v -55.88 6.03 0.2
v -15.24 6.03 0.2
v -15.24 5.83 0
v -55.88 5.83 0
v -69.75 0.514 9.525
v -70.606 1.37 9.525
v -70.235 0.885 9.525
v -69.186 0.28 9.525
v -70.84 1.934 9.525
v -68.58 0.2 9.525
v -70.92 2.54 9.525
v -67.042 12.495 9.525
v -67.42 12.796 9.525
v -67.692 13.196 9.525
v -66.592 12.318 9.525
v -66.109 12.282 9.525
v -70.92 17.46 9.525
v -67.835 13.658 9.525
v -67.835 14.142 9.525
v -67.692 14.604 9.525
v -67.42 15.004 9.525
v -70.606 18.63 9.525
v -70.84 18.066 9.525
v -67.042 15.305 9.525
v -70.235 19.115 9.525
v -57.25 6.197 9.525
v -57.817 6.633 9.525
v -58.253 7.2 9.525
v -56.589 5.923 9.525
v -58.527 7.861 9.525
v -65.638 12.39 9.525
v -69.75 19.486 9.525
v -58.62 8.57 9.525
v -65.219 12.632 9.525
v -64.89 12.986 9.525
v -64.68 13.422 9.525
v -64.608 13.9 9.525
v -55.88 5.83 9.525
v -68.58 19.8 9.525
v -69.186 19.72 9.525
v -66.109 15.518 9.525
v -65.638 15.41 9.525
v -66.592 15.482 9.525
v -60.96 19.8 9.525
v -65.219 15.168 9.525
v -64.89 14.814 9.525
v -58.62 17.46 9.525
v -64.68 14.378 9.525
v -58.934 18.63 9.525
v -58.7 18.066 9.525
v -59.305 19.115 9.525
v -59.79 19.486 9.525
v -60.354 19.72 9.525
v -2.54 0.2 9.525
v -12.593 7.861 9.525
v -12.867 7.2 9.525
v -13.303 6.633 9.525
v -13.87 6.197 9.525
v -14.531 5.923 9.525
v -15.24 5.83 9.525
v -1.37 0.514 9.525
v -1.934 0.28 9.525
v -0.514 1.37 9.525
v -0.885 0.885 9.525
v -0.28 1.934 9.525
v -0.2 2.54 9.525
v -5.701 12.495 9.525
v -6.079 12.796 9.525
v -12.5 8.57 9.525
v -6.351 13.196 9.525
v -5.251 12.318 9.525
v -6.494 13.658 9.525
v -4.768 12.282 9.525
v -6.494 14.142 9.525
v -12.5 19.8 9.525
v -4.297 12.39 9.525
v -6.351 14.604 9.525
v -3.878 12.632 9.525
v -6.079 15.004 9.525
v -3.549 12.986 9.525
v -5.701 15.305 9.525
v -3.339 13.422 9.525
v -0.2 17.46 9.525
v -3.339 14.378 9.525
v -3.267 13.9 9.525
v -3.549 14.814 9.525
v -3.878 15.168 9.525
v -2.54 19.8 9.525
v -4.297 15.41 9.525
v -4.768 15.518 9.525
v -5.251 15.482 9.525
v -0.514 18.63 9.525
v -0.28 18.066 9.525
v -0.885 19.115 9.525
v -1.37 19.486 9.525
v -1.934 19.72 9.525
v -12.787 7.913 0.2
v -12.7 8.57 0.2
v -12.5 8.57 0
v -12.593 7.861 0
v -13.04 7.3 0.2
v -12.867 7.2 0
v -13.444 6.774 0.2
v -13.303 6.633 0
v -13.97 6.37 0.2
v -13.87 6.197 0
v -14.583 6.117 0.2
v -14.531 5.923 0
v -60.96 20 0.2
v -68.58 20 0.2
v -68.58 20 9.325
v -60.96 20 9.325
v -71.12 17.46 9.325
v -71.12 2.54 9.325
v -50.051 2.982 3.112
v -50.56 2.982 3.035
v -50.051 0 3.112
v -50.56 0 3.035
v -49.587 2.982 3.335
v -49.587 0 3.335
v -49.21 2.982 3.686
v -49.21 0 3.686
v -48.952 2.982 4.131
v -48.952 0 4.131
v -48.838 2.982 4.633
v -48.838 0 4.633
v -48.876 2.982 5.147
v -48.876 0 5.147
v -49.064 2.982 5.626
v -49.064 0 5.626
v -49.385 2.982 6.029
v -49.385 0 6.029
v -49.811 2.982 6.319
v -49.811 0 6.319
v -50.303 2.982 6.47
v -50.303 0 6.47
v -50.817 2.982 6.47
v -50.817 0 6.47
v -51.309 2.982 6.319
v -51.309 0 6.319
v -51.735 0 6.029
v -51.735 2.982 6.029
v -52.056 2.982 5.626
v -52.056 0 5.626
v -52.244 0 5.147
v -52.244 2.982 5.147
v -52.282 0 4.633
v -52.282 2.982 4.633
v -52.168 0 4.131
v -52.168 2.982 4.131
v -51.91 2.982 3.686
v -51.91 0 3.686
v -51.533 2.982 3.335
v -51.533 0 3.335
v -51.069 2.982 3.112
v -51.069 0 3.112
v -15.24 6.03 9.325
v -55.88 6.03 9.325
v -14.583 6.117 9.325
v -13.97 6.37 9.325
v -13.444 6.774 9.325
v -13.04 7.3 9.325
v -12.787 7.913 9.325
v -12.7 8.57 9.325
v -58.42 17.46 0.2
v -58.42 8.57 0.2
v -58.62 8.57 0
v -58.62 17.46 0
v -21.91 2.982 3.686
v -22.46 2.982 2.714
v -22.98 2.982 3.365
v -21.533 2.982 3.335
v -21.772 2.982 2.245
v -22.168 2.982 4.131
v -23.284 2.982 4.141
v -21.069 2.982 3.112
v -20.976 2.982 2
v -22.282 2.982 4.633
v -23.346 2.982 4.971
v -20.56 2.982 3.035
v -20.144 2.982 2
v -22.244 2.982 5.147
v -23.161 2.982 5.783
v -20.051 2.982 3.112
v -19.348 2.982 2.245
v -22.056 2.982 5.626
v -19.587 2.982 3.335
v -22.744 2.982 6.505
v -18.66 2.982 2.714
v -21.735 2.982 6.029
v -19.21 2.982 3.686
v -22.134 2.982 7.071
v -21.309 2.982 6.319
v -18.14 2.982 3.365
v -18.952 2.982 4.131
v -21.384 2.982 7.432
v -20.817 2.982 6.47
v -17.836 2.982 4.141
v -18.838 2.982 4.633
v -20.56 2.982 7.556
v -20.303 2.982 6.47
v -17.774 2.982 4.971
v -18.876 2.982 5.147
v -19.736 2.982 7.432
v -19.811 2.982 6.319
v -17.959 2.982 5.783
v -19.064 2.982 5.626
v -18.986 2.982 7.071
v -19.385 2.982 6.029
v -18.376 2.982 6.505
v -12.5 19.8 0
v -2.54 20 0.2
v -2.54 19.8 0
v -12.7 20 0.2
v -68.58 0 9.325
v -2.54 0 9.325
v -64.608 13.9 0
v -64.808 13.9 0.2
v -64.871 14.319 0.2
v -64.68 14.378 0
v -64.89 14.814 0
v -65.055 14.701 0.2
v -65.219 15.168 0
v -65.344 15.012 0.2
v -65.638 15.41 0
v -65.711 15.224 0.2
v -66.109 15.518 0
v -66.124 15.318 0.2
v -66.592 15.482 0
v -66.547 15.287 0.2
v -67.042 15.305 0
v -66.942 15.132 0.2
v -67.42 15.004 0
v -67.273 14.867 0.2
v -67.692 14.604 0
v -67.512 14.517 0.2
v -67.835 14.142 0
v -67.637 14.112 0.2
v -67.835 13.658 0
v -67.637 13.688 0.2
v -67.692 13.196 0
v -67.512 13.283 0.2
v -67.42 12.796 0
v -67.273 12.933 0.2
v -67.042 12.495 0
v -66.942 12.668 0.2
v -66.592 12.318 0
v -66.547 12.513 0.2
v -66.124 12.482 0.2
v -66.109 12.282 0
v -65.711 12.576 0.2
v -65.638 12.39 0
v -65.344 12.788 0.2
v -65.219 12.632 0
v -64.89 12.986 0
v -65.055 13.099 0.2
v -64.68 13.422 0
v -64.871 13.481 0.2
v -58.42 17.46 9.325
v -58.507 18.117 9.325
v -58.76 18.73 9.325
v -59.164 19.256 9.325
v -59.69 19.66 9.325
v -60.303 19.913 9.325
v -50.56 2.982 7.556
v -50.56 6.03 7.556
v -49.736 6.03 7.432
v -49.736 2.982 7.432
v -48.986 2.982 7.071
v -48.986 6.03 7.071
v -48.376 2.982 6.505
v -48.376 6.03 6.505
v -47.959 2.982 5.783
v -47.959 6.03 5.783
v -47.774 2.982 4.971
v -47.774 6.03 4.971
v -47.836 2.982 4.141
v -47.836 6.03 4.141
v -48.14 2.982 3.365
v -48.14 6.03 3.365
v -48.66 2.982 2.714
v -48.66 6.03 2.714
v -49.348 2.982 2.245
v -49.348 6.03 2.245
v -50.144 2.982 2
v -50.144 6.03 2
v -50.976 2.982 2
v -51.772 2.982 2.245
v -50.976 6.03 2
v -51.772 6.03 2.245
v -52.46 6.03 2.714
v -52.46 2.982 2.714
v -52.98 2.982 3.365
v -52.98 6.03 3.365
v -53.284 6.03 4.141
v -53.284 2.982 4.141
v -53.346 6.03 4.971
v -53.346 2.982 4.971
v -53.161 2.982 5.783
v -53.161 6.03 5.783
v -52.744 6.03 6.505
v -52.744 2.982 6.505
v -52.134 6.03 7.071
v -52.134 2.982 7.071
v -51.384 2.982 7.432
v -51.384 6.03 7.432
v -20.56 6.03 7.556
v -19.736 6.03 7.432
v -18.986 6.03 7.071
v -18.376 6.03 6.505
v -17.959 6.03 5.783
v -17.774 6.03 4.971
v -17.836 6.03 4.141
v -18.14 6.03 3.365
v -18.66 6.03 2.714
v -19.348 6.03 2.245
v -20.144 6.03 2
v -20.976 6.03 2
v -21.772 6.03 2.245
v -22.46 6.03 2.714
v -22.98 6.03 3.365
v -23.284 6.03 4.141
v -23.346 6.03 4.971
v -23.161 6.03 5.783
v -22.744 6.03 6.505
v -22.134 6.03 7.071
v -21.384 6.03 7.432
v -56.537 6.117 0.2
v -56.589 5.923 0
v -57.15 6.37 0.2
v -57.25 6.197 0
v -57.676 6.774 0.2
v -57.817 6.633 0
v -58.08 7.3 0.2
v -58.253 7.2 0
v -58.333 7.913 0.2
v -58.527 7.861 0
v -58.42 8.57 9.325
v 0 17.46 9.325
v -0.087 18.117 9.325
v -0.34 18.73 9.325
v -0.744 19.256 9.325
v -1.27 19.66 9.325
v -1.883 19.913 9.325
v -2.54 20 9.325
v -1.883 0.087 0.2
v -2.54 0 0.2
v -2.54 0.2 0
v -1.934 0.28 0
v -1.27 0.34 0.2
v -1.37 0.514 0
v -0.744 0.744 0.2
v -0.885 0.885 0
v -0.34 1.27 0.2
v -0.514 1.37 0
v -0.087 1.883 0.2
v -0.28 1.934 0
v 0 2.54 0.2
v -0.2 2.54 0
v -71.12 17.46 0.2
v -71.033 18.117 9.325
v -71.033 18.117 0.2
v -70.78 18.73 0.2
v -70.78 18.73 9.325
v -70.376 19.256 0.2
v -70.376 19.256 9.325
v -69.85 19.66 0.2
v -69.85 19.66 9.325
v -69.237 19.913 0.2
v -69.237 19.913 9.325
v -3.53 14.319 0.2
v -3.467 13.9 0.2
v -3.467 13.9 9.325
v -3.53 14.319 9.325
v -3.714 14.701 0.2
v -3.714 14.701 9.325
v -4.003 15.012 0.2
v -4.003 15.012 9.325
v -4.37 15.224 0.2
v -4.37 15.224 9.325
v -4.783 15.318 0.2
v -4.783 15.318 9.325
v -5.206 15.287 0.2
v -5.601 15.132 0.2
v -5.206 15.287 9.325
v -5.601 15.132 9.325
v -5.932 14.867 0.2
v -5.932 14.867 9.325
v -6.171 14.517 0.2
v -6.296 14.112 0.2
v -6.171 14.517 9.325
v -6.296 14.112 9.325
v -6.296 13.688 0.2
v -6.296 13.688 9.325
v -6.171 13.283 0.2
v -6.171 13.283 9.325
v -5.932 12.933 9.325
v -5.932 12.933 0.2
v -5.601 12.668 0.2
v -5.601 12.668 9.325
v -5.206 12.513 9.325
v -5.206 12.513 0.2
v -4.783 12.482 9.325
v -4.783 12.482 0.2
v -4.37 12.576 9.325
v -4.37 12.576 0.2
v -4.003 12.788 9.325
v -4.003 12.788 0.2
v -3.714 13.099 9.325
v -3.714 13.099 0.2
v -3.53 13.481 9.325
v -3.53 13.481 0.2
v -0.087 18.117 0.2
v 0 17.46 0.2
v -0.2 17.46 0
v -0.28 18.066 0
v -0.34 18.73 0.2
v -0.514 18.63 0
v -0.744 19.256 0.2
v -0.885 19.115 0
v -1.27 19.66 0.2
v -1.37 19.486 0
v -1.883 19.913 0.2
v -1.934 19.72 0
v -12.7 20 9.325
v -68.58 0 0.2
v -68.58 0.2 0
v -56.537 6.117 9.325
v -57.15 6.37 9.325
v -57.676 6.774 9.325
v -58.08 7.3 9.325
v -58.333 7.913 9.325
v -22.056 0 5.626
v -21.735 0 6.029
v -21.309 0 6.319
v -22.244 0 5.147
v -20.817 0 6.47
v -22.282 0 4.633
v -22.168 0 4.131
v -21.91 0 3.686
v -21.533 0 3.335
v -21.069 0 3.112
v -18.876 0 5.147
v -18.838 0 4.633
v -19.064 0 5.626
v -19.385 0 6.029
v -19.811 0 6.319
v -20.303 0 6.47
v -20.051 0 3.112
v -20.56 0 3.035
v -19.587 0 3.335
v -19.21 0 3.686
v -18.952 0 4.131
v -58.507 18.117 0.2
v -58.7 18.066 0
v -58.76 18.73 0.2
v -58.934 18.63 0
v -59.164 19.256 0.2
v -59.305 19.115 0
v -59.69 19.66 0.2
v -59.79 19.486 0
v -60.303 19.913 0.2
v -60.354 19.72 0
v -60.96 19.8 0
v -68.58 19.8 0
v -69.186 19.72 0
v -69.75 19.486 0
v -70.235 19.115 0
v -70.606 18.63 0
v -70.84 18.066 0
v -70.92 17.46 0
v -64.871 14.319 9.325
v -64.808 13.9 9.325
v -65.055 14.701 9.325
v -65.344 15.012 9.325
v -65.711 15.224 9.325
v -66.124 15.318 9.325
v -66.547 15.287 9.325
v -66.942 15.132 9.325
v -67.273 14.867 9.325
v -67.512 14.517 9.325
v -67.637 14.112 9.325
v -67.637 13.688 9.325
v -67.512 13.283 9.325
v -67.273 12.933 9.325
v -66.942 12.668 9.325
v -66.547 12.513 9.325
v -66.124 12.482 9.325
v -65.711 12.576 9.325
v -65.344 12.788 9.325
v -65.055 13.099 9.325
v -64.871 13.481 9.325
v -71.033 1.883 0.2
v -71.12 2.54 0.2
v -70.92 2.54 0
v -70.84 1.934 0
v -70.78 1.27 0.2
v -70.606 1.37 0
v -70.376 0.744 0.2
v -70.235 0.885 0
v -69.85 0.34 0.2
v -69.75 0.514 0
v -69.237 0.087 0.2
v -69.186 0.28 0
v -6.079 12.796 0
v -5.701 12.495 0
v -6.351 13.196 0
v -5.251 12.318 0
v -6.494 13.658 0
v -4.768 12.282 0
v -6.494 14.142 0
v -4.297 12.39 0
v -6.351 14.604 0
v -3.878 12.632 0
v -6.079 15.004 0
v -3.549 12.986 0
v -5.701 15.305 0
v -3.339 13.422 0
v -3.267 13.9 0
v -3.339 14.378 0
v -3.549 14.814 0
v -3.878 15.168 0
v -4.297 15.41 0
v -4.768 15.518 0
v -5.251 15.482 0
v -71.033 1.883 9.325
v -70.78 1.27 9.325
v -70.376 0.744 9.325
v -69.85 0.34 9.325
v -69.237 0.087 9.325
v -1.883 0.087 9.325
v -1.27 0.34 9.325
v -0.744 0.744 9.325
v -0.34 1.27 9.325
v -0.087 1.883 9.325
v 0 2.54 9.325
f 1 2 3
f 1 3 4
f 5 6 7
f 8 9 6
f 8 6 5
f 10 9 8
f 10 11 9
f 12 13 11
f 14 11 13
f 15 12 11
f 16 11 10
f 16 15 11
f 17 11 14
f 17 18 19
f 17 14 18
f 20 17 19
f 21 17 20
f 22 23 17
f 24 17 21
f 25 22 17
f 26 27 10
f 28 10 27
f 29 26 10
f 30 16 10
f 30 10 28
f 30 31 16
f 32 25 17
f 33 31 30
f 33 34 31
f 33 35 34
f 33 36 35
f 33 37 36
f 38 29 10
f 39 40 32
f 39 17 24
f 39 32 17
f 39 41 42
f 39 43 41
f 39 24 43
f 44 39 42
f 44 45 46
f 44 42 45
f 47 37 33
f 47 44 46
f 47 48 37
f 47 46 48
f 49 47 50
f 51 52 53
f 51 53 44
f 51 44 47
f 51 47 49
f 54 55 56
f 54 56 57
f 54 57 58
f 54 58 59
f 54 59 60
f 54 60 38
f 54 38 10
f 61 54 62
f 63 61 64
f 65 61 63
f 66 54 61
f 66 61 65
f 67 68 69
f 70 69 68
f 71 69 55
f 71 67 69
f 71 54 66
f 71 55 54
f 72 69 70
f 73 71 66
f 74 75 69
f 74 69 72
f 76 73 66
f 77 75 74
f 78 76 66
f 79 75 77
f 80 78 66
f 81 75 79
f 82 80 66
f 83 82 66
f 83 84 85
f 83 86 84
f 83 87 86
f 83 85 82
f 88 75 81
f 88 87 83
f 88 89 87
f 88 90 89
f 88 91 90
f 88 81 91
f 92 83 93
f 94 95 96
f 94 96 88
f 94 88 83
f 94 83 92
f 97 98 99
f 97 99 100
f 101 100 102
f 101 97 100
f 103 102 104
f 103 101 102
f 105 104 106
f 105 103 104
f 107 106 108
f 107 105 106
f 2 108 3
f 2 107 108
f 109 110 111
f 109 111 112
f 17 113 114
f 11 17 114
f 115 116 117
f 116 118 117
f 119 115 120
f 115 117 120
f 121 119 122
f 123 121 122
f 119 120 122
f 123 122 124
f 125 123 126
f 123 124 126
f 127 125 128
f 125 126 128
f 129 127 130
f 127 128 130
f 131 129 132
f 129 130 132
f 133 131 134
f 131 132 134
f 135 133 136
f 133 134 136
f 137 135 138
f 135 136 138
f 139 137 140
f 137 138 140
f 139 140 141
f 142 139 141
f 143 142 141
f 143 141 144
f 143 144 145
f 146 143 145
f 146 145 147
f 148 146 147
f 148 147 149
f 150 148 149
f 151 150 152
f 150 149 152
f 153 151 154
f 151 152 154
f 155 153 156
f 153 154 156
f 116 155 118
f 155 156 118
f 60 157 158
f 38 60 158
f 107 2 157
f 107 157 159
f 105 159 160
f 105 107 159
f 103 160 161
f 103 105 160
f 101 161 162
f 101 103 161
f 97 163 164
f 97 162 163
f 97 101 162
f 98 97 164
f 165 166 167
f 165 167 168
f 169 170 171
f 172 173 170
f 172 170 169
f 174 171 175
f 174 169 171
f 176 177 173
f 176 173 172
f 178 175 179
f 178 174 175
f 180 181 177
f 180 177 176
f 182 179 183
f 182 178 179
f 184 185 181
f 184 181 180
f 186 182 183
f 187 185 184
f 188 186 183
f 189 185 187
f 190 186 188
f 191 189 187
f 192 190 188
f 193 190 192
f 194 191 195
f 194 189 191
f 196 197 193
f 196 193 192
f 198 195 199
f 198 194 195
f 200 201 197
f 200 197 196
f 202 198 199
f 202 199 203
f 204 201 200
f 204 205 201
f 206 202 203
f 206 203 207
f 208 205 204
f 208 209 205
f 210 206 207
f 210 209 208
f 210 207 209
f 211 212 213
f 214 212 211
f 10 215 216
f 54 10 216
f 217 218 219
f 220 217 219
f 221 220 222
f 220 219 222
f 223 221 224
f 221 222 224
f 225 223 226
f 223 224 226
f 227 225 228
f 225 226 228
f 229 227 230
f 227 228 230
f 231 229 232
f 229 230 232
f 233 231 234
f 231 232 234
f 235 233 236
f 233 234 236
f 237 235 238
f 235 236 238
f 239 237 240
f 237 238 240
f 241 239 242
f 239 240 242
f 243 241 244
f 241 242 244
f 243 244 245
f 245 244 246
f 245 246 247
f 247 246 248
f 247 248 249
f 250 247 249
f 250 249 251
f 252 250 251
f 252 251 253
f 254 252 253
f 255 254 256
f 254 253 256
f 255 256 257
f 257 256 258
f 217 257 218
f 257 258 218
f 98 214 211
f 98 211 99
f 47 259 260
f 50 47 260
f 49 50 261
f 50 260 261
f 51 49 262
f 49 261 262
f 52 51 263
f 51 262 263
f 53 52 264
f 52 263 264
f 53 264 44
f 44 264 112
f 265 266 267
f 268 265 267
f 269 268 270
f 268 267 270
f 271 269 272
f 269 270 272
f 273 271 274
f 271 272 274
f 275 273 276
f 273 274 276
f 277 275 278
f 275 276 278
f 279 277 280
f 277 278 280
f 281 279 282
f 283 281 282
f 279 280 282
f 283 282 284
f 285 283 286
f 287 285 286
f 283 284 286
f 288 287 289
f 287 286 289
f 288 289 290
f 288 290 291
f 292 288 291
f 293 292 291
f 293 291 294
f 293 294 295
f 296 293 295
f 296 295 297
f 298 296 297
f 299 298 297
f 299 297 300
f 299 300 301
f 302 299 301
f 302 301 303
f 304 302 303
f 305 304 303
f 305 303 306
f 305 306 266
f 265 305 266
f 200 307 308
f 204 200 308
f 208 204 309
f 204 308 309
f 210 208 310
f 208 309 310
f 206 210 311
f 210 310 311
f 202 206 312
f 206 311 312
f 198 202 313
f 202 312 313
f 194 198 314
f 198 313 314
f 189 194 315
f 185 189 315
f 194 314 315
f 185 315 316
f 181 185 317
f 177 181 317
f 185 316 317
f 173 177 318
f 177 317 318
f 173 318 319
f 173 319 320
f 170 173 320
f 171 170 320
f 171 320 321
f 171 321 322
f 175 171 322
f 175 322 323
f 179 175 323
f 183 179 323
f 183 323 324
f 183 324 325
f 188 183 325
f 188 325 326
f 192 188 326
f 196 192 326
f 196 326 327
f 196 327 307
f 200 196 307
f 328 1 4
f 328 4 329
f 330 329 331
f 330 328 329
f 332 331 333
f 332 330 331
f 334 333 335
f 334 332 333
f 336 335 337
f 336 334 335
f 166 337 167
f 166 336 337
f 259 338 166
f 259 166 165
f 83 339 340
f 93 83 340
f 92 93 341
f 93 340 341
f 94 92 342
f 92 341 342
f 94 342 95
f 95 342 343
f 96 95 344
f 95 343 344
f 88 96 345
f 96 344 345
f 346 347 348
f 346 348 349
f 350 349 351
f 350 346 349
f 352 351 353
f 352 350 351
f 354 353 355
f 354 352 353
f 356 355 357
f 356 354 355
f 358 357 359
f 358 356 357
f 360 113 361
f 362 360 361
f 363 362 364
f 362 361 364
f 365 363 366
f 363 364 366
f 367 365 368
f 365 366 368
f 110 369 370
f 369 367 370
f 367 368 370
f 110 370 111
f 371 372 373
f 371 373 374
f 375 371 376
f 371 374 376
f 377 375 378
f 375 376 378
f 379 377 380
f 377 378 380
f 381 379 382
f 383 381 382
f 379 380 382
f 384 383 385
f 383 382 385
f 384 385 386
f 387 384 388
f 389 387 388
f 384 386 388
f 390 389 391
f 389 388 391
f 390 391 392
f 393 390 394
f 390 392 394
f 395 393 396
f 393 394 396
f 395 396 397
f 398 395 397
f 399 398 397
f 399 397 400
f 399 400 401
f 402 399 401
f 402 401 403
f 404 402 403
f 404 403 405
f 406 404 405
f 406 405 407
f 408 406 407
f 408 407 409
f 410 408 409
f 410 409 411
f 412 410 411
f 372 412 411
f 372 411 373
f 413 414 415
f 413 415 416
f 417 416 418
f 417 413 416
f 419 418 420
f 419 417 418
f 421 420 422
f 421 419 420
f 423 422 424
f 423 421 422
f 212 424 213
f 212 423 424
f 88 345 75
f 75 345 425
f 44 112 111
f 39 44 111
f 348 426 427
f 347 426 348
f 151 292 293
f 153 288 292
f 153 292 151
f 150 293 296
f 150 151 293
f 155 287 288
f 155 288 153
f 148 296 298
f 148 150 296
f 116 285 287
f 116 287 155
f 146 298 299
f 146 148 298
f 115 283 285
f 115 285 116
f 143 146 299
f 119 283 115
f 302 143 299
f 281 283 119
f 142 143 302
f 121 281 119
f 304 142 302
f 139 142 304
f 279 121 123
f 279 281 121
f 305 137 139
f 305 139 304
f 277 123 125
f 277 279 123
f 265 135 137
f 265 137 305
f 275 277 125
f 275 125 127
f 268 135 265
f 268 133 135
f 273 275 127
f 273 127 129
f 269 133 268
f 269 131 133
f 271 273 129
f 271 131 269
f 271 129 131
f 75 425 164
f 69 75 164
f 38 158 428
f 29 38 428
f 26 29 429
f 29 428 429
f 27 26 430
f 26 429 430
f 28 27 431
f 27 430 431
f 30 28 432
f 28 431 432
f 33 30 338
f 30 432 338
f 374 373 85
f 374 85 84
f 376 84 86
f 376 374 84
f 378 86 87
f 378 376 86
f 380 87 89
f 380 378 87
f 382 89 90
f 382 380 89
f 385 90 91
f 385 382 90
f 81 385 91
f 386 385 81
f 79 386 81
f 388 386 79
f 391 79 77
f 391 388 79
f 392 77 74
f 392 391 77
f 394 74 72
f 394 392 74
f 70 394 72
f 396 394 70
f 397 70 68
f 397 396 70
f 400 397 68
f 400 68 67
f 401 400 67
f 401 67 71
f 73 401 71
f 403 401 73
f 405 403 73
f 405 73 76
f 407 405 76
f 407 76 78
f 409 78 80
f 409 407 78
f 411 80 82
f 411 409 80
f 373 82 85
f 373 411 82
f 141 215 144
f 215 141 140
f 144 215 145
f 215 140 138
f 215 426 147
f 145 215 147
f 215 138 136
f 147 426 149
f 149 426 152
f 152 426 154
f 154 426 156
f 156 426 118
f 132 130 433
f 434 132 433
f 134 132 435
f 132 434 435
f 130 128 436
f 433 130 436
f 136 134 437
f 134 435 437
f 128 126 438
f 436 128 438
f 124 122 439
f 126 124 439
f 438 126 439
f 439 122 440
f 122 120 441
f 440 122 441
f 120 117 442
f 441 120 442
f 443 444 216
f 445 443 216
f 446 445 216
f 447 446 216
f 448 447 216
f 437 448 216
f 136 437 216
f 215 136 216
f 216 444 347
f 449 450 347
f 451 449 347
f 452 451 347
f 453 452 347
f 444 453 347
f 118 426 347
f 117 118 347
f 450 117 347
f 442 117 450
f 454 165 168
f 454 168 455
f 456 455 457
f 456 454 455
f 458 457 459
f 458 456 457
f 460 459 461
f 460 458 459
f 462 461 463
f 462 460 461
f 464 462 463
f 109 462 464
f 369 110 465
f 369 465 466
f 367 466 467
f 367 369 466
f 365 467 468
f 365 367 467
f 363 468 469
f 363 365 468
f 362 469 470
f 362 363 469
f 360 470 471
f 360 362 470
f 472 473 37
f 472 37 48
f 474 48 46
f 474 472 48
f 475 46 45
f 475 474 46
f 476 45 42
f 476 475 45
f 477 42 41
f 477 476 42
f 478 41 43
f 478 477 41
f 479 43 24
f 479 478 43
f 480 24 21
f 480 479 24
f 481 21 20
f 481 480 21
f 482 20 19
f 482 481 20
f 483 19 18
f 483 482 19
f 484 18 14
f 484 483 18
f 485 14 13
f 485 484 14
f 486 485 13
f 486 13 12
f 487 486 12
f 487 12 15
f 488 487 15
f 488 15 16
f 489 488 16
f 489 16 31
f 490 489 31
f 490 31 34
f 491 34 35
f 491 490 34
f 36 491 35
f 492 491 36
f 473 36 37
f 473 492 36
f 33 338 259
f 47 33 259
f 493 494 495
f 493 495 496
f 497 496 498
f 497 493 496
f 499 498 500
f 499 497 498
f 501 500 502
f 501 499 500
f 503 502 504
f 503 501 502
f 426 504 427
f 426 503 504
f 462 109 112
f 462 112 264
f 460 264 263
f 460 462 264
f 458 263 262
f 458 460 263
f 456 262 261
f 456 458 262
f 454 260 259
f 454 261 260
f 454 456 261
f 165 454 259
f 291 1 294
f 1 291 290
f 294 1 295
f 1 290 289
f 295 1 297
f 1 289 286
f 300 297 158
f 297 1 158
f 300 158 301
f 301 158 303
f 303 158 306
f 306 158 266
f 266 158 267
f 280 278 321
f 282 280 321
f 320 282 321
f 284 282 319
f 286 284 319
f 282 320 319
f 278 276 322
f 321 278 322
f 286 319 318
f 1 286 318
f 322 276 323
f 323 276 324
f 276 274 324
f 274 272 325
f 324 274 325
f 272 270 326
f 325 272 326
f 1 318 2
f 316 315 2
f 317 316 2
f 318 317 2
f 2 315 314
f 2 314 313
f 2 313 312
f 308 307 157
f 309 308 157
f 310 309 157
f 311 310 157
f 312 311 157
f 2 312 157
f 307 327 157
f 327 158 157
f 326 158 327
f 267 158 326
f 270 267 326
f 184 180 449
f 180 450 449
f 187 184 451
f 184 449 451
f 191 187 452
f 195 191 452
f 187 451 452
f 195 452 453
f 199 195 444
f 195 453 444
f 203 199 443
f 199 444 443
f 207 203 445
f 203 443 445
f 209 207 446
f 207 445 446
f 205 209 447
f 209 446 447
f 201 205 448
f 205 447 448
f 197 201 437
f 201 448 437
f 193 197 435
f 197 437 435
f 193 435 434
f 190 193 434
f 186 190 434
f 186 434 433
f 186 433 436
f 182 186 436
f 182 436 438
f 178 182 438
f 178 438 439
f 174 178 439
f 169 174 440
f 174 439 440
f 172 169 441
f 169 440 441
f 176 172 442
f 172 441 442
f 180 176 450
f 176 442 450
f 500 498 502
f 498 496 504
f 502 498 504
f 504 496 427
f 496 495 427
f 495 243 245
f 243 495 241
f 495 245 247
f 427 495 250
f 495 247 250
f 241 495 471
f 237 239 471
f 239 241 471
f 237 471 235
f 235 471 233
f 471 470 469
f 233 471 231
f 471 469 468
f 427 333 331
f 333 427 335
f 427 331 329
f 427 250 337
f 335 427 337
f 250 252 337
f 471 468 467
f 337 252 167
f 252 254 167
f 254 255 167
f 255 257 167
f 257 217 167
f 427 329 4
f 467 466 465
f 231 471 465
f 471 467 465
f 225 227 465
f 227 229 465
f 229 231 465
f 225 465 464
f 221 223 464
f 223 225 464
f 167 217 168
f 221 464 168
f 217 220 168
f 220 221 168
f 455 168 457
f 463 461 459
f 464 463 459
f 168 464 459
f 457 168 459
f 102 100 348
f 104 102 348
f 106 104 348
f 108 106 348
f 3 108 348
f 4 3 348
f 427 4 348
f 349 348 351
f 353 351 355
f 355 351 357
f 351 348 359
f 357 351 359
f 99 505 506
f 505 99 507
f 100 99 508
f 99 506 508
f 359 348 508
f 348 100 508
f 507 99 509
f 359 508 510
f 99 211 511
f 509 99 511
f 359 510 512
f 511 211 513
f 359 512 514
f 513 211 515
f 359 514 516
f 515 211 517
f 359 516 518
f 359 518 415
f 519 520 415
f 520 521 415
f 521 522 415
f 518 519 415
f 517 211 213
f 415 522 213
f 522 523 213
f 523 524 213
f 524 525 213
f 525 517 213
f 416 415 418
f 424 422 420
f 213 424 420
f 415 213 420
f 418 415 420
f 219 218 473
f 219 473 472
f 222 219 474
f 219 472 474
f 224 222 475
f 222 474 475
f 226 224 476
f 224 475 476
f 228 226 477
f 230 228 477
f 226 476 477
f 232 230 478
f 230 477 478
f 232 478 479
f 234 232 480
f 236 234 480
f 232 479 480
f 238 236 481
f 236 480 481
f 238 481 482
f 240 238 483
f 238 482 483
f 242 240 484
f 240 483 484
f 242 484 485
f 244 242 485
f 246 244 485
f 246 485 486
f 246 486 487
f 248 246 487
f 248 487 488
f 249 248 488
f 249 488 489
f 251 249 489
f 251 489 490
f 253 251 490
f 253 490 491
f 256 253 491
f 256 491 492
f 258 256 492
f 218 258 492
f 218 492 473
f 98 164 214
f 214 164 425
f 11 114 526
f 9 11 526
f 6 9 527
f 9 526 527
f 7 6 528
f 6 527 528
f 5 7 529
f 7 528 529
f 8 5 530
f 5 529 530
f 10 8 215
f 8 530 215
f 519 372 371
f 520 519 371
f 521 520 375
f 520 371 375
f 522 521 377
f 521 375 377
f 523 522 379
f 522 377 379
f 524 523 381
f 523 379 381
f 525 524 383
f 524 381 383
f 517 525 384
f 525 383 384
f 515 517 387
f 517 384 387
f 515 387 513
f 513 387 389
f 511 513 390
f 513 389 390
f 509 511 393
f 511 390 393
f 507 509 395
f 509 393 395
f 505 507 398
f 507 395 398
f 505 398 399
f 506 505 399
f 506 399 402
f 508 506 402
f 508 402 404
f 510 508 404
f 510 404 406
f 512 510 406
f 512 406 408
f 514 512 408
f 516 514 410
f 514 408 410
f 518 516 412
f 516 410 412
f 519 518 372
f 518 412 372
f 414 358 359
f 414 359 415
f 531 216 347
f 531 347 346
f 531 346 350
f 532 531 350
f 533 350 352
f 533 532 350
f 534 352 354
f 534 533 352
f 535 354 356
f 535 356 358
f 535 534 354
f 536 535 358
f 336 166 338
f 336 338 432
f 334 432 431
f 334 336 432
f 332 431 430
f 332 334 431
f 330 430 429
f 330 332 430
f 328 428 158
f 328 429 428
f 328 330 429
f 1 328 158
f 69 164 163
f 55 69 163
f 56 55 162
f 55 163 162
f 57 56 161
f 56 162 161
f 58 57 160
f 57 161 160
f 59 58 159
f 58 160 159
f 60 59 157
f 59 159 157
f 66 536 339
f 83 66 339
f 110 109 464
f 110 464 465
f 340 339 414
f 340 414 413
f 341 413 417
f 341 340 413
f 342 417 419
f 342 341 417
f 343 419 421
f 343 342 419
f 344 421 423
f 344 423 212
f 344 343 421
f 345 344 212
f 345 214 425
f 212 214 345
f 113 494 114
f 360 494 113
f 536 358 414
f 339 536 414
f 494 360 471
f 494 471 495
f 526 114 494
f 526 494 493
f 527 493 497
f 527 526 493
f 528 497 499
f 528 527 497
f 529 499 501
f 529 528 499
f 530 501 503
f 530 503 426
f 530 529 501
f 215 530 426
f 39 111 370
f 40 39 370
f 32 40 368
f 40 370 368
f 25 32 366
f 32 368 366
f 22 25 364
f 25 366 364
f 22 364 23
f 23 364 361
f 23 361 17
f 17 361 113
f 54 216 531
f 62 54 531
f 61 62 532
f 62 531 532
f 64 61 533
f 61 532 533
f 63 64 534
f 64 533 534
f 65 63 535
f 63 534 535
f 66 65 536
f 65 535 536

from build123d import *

# Parameters (mm, degrees)
SKETCH1_W                       = 71.12
SKETCH1_H                       = 20
EXTRUDE1_DEPTH                  = 9.525
SKETCH2_W                       = 45.72
SKETCH2_H                       = 13.97
EXTRUDE2_DEPTH                  = 10.525
HOLE1_D                         = 3.4544
HOLE1_CBORE_D                   = 5.588
HOLE1_CBORE_DEPTH               = 3.048
F_4_40_TAPPED_HOLE1_D           = 2.2606
F_4_40_TAPPED_HOLE1_DEPTH       = 12.6746
F_4_40_TAPPED_HOLE1_CBORE_D     = 2.8448
F_4_40_TAPPED_HOLE1_CBORE_DEPTH = 10.7696
F_4_40_TAPPED_HOLE1_TIP         = 0.679152758
FILLET1_R                       = 2.54
CHAMFER1_SIZE                   = 0.2


with BuildPart() as part:
    # Sketch1 → Extrude1 (new body)
    with BuildSketch(Plane.XY):
        with Locations((-35.56, 10)):
            Rectangle(SKETCH1_W, SKETCH1_H)
    extrude(amount=EXTRUDE1_DEPTH)

    # Sketch2 → Extrude2 (cut, through all)
    with BuildSketch(Plane.XY.offset(9.525)):
        with Locations((-35.56, 13.015)):
            Rectangle(SKETCH2_W, SKETCH2_H)
    extrude(amount=-EXTRUDE2_DEPTH, mode=Mode.SUBTRACT)

    # Hole1 (through all)
    with Locations(Plane(origin=(-50.56, 6.03, 4.7625), x_dir=(0, 0, 1), z_dir=(0, 1, 0))):
        with Locations((0, 0), (0, 30)):
            CounterBoreHole(HOLE1_D / 2, HOLE1_CBORE_D / 2, HOLE1_CBORE_DEPTH)

    # #4-40 Tapped Hole1
    with Locations(Plane(origin=(-66.2305, 13.9, 9.525), x_dir=(1, 0, 0), z_dir=(0, 0, 1))):
        with Locations((0, 0), (61.341, 0)):
            CounterBoreHole(F_4_40_TAPPED_HOLE1_D / 2, F_4_40_TAPPED_HOLE1_CBORE_D / 2, F_4_40_TAPPED_HOLE1_CBORE_DEPTH, depth=F_4_40_TAPPED_HOLE1_DEPTH)
            with Locations((0, 0, -(F_4_40_TAPPED_HOLE1_DEPTH + F_4_40_TAPPED_HOLE1_TIP / 2))):  # 118° drill point
                Cone(0, F_4_40_TAPPED_HOLE1_D / 2, F_4_40_TAPPED_HOLE1_TIP, mode=Mode.SUBTRACT)

    # Fillet1
    fillet1_edges = [part.edges().sort_by_distance(p)[0] for p in [
        (-58.42, 6.03, 4.7625),
        (-58.42, 20, 4.7625),
        (-12.7, 6.03, 4.7625),
        (0, 0, 4.7625),
        (-71.12, 0, 4.7625),
        (-71.12, 20, 4.7625),
        (0, 20, 4.7625),
    ]]
    fillet(fillet1_edges, radius=FILLET1_R)

    # Chamfer1
    chamfer1_edges = [part.edges().sort_by_distance(p)[0] for p in [
        (-6.3119, 13.9, 0),
        (-6.3119, 13.9, 9.525),
        (-67.6529, 13.9, 0),
        (-67.6529, 13.9, 9.525),
        (-35.56, 0, 0),
        (-35.56, 0, 9.525),
        (-64.77, 20, 0),
        (-58.42, 13.015, 0),
        (-35.56, 6.03, 0),
        (-12.7, 14.285, 0),
        (-7.62, 20, 0),
        (0, 10, 0),
        (-71.12, 10, 0),
        (-0.743948776, 19.256051224, 0),
        (-59.163948776, 19.256051224, 0),
        (-70.376051224, 19.256051224, 0),
        (-0.743948776, 0.743948776, 0),
        (-70.376051224, 0.743948776, 0),
        (-71.12, 10, 9.525),
        (-58.42, 13.015, 9.525),
        (-64.77, 20, 9.525),
        (0, 10, 9.525),
        (-7.62, 20, 9.525),
        (-12.7, 14.285, 9.525),
        (-35.56, 6.03, 9.525),
        (-0.743948776, 19.256051224, 9.525),
        (-59.163948776, 19.256051224, 9.525),
        (-70.376051224, 19.256051224, 9.525),
        (-0.743948776, 0.743948776, 9.525),
        (-70.376051224, 0.743948776, 9.525),
        (-13.443948776, 6.773948776, 9.525),
        (-13.443948776, 6.773948776, 0),
        (-57.676051224, 6.773948776, 9.525),
        (-57.676051224, 6.773948776, 0),
    ]]
    chamfer(chamfer1_edges, length=CHAMFER1_SIZE)


solid = part.part
